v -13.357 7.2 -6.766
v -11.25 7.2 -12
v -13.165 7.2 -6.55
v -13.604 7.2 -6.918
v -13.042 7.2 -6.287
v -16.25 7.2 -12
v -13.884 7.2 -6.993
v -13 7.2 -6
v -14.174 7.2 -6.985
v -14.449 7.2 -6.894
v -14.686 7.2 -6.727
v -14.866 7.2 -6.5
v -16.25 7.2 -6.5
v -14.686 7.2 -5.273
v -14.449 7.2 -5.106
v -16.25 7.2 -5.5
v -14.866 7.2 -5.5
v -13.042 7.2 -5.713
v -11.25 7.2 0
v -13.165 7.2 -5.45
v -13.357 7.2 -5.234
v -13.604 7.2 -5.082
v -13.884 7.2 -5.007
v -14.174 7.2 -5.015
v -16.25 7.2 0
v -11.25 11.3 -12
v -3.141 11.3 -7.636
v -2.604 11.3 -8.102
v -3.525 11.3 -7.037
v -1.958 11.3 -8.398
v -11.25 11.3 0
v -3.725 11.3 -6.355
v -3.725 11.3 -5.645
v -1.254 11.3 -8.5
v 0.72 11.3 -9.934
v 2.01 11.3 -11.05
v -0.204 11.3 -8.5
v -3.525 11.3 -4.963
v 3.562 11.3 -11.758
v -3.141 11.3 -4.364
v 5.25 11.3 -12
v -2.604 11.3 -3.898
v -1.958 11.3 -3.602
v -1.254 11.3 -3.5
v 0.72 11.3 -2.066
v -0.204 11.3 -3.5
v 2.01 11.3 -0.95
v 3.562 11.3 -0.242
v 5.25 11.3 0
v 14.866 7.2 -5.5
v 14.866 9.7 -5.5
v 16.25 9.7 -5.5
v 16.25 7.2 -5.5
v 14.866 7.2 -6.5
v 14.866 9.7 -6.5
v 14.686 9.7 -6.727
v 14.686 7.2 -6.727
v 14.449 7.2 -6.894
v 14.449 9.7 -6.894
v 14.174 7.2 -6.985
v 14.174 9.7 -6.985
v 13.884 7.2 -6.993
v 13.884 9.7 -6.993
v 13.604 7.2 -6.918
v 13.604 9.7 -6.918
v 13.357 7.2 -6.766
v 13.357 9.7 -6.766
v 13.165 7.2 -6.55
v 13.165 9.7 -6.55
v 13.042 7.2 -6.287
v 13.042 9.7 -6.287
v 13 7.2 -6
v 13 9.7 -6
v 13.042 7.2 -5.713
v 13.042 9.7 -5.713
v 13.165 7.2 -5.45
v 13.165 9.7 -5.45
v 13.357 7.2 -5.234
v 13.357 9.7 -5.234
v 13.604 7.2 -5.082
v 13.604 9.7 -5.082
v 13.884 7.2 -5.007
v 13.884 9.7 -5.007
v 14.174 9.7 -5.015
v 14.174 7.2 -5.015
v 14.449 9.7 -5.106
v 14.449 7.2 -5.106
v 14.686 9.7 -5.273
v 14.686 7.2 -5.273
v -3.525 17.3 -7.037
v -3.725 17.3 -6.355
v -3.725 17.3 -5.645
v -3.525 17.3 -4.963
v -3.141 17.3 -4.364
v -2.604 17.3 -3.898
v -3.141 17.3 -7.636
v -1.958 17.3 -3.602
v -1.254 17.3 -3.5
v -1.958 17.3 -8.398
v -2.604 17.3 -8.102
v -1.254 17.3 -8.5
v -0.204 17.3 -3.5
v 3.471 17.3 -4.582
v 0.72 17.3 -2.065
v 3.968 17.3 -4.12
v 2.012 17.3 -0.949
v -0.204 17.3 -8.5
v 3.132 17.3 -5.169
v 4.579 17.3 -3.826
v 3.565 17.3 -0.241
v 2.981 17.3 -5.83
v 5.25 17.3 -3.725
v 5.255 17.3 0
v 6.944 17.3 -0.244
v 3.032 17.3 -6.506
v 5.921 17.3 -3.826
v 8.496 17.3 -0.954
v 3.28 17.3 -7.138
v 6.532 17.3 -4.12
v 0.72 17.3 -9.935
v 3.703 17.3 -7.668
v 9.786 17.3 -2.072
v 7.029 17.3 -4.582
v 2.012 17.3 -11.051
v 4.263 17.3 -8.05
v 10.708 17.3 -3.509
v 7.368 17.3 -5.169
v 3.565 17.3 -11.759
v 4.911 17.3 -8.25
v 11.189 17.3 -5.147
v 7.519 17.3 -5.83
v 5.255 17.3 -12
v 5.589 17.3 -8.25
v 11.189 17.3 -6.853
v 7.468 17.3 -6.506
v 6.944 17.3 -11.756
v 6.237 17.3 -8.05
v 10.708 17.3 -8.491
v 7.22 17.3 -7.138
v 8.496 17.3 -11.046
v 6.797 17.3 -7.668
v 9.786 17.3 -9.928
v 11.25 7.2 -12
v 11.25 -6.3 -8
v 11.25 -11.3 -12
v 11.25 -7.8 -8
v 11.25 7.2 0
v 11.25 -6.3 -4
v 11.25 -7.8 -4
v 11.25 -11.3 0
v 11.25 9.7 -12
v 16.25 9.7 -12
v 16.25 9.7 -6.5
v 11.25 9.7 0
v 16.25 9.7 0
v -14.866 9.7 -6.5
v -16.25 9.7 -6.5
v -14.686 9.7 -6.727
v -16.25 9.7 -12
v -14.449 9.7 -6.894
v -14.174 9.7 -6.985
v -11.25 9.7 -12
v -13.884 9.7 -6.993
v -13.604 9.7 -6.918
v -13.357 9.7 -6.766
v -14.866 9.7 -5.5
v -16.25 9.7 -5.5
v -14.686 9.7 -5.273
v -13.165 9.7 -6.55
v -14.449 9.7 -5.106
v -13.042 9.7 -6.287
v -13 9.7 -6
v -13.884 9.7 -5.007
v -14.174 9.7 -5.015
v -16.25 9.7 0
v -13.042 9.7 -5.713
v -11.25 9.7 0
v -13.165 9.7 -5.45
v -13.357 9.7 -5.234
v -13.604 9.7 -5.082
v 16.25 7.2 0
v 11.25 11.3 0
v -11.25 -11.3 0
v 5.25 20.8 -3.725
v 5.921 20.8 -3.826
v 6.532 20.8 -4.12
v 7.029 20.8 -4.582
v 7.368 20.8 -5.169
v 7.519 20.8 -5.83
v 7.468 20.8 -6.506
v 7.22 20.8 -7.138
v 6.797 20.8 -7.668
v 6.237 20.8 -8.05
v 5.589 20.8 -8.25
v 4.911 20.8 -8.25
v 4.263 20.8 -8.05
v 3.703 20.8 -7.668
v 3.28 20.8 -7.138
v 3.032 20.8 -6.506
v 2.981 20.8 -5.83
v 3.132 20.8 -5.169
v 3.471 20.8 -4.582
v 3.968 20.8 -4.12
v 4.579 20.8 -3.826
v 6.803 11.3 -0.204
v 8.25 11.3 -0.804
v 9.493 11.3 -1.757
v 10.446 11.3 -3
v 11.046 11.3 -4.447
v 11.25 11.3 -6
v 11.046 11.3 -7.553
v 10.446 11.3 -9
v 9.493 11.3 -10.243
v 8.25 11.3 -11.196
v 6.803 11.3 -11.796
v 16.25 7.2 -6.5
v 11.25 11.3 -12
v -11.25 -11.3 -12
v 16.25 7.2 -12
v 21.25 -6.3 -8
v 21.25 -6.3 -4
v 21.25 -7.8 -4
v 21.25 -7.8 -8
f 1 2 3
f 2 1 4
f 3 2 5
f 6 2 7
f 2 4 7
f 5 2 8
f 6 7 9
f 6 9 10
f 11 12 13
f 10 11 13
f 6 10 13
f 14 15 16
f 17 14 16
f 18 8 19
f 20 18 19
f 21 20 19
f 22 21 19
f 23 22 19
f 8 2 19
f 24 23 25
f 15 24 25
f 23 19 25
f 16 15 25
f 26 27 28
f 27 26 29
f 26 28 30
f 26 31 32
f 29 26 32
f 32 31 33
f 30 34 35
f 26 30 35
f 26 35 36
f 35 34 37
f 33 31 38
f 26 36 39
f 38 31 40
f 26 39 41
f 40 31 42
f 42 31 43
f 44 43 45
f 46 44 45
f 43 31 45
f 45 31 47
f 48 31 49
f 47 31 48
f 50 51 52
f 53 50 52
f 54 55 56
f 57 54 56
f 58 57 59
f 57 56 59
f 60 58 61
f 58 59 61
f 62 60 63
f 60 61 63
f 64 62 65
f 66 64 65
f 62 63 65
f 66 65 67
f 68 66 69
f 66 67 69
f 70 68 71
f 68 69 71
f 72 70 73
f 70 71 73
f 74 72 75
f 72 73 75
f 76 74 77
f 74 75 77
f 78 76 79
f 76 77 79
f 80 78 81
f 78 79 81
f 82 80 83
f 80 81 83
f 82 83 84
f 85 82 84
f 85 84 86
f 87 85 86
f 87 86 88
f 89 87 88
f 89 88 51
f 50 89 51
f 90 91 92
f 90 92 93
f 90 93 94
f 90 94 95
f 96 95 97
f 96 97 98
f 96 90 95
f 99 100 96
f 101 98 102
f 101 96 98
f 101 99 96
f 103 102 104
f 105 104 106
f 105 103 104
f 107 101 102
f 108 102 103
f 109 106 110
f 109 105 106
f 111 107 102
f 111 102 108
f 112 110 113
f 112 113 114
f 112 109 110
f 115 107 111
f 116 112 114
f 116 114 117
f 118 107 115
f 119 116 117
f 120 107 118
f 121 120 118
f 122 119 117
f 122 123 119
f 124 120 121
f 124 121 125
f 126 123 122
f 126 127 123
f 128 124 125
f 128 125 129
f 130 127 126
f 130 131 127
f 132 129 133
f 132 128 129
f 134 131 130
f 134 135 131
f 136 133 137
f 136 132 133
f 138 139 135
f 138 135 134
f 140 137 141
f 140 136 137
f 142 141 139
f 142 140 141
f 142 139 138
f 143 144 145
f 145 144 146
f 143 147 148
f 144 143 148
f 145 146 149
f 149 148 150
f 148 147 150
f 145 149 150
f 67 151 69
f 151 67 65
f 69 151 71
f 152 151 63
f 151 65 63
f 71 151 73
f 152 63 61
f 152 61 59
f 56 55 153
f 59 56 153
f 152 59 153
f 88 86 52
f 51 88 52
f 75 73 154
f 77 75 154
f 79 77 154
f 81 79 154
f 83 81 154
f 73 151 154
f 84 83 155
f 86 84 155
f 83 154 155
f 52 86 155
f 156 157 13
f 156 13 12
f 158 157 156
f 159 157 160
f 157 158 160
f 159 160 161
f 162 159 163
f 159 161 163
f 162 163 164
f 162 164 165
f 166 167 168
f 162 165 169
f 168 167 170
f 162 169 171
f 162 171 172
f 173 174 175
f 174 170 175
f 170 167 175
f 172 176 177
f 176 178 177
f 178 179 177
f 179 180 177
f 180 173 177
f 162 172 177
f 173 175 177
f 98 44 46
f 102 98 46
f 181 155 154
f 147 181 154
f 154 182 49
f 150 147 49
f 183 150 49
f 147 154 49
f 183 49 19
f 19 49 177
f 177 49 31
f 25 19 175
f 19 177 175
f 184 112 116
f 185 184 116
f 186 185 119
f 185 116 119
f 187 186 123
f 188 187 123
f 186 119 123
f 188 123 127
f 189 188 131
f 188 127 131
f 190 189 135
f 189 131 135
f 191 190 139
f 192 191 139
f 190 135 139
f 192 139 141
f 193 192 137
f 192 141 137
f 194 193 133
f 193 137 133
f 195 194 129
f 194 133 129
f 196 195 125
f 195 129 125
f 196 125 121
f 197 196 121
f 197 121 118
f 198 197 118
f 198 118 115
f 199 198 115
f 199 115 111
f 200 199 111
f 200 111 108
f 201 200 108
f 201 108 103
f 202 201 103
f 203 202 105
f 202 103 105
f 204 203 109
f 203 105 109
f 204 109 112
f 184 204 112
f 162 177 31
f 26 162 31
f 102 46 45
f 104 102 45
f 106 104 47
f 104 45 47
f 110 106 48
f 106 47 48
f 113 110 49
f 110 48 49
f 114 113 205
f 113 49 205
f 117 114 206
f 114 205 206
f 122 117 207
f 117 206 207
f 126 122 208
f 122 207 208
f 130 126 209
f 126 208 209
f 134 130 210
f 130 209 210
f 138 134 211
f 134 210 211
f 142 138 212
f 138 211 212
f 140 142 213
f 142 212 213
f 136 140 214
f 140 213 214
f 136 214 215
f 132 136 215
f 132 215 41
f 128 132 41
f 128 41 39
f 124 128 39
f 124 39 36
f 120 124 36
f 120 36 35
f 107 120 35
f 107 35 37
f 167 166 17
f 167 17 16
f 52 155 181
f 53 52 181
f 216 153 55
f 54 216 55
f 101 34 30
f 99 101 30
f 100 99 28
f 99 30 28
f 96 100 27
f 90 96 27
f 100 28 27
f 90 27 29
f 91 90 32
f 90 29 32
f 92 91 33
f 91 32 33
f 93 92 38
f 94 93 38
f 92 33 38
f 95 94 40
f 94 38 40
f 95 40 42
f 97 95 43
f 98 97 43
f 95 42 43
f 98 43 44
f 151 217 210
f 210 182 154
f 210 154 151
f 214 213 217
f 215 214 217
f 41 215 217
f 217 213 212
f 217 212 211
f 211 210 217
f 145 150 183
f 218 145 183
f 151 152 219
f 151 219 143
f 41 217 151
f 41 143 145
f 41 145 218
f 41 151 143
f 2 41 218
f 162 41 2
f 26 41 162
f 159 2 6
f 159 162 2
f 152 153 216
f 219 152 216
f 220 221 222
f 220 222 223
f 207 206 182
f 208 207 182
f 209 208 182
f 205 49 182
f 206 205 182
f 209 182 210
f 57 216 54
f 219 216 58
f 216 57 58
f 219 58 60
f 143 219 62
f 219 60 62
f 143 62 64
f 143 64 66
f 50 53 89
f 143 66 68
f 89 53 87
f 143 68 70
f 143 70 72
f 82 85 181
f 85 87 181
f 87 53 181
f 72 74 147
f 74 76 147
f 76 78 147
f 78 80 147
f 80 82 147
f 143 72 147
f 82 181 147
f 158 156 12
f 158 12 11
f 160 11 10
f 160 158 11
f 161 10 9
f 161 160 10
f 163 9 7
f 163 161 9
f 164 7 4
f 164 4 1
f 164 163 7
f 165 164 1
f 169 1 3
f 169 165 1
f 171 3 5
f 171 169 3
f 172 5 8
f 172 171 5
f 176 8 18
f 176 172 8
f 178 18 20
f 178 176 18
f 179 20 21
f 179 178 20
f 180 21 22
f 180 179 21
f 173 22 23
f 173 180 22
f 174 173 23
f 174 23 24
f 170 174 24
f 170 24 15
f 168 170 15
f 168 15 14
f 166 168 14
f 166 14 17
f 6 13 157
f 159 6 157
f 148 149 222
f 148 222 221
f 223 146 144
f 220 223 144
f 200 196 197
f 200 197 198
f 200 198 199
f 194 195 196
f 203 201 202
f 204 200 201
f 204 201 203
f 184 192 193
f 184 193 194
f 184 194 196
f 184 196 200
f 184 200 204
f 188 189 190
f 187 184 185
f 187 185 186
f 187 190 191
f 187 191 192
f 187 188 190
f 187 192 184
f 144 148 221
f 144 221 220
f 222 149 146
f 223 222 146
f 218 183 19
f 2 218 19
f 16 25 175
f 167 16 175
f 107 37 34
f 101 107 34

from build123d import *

# Parameters (mm, degrees)
BOSS_EXTRUDE1_DEPTH = 12
SKETCH2_W           = 4
SKETCH2_H           = 1.5
BOSS_EXTRUDE2_DEPTH = 10
CUT_EXTRUDE1_DEPTH  = 2.5
BOSS_EXTRUDE4_DEPTH = 6
SKETCH6_R           = 2.275
BOSS_EXTRUDE5_DEPTH = 3.5


# Read off the part's stored shape, not the designer's step: Boss-Extrude4
with BuildPart() as part:
    # Sketch1 → Boss-Extrude1 (new body)
    with BuildSketch(Plane.XY):
        Polygon((-11.25, 11.3), (11.25, 11.3), (11.25, 9.7), (16.25, 9.7), (16.25, 7.2), (11.25, 7.2), (11.25, -11.3), (-11.25, -11.3), (-11.25, 7.2), (-16.25, 7.2), (-16.25, 9.7), (-11.25, 9.7), align=None)
    extrude(amount=-BOSS_EXTRUDE1_DEPTH)

    # Sketch2 → Boss-Extrude2 (add)
    with BuildSketch(Plane(origin=(11.25, 0, 0), x_dir=(0, 0, -1), z_dir=(1, 0, 0))):
        with Locations((6, -7.05)):
            Rectangle(SKETCH2_W, SKETCH2_H)
    extrude(amount=BOSS_EXTRUDE2_DEPTH)

    # Sketch3 → Cut-Extrude1 (cut)
    with BuildSketch(Plane(origin=(0, 9.7, 0), x_dir=(1, 0, 0), z_dir=(0, 1, 0))):
        with BuildLine():
            Line((-16.25, 6.5), (-14.866025404, 6.5))
            ThreePointArc((-14.866025404, 6.5), (-13, 6), (-14.866025404, 5.5))
            Line((-14.866025404, 5.5), (-16.25, 5.5))
            Line((-16.25, 5.5), (-16.25, 6.5))
        make_face()
        with BuildLine():
            Line((16.25, 6.5), (14.866025404, 6.5))
            ThreePointArc((14.866025404, 6.5), (13, 6), (14.866025404, 5.5))
            Line((14.866025404, 5.5), (16.25, 5.5))
            Line((16.25, 5.5), (16.25, 6.5))
        make_face()
    extrude(amount=-CUT_EXTRUDE1_DEPTH, mode=Mode.SUBTRACT)

    # Boss-Extrude4 outline → Boss-Extrude4 (add)
    with BuildSketch(Plane(origin=(0, 11.3, 0), x_dir=(1, 0, 0), z_dir=(0, 1, 0))):
        with BuildLine():
            Line((-0.204356057, 8.5), (-1.254356051, 8.499996205))
            ThreePointArc((-1.254356051, 8.499996205), (-3.75, 6), (-1.254356051, 3.500003795))
            Line((-1.254356051, 3.500003795), (-0.204356057, 3.5))
            ThreePointArc((-0.204356057, 3.5), (11.25, 6), (-0.204356057, 8.5))
        make_face()
    extrude(amount=BOSS_EXTRUDE4_DEPTH)

    # Sketch6 → Boss-Extrude5 (add)
    with BuildSketch(Plane(origin=(0, 17.3, 0), x_dir=(1, 0, 0), z_dir=(0, 1, 0))):
        with Locations(Location((5.25, 6, 0), (0, 0, 270))):
            Circle(SKETCH6_R)
    extrude(amount=BOSS_EXTRUDE5_DEPTH)


solid = part.part
